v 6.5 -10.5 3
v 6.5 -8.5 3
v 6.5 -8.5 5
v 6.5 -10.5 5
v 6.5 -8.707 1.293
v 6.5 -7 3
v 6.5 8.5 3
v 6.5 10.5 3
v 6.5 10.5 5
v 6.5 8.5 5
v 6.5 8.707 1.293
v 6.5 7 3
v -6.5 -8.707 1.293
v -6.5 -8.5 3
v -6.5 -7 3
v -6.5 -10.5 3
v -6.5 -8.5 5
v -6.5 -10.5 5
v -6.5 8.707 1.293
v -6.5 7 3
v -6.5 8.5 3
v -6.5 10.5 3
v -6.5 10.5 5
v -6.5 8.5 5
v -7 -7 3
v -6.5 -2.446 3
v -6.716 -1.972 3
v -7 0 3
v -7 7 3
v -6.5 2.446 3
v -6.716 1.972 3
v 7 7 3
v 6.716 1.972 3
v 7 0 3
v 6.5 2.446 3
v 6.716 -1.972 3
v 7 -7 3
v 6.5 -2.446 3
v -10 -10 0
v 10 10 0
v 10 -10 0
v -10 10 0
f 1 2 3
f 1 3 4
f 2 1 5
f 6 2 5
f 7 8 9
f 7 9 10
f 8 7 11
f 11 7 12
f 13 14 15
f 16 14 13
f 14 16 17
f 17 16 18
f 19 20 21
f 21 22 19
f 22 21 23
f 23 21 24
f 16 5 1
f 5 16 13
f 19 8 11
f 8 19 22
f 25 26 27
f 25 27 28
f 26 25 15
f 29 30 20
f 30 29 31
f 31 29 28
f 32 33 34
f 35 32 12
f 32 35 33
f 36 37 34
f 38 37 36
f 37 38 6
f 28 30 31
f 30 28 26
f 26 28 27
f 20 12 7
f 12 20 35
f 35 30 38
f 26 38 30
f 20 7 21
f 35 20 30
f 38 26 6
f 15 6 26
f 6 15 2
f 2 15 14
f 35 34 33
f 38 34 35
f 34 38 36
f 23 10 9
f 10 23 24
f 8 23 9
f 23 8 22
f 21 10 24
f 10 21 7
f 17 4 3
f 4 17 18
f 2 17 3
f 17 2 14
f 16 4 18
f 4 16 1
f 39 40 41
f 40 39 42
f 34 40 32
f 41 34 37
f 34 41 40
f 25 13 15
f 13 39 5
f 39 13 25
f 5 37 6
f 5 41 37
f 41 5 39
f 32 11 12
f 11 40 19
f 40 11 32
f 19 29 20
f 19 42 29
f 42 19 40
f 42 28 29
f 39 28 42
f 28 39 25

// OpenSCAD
module pyramid(width, height) {
	points = [
		[width/2,width/2,0],
		[width/2,-width/2,0],
		[-width/2,-width/2,0],
		[-width/2,width/2,0],
      [0,0,height]
	];
	faces = [
		[0,1,4],[1,2,4],[2,3,4],[3,0,4],
              [1,0,3],[2,1,3]
	];
	polyhedron(points=points, faces=faces);
}

module support(height, width, depth, edge) {
	polyhedron(
		points = [
			[depth/2,0,0],
			[depth/2,width/2,height],
			[depth/2,-width/2,height],
			[-depth/2,0,0],
			[-depth/2,width/2,height],
			[-depth/2,-width/2,height]
		],
		faces = [
			[0,1,2],
			[3,5,4],
			[3,0,2,5],
			[0,3,4,1],
			[1,4,5,2]
		]
	);
	translate([-depth/2,width/2-edge,height])
	cube([depth,edge,edge]);
	translate([-depth/2,-width/2,height])
	cube([depth,edge,edge]);
}

module train_support(height) {
	difference() {
		translate([0,0,height-10])
		support(height=10, width=21, depth=13, edge=2);
		translate([-10,-10,-100])
		cube([20,20,100]);
	}

	difference() {
		pyramid(width=20, height=10);
		translate([-10,-10,height])
		cube([20,20,100]);
	}

	cylinder(h=height, r=7);
}

train_support(height=3);
